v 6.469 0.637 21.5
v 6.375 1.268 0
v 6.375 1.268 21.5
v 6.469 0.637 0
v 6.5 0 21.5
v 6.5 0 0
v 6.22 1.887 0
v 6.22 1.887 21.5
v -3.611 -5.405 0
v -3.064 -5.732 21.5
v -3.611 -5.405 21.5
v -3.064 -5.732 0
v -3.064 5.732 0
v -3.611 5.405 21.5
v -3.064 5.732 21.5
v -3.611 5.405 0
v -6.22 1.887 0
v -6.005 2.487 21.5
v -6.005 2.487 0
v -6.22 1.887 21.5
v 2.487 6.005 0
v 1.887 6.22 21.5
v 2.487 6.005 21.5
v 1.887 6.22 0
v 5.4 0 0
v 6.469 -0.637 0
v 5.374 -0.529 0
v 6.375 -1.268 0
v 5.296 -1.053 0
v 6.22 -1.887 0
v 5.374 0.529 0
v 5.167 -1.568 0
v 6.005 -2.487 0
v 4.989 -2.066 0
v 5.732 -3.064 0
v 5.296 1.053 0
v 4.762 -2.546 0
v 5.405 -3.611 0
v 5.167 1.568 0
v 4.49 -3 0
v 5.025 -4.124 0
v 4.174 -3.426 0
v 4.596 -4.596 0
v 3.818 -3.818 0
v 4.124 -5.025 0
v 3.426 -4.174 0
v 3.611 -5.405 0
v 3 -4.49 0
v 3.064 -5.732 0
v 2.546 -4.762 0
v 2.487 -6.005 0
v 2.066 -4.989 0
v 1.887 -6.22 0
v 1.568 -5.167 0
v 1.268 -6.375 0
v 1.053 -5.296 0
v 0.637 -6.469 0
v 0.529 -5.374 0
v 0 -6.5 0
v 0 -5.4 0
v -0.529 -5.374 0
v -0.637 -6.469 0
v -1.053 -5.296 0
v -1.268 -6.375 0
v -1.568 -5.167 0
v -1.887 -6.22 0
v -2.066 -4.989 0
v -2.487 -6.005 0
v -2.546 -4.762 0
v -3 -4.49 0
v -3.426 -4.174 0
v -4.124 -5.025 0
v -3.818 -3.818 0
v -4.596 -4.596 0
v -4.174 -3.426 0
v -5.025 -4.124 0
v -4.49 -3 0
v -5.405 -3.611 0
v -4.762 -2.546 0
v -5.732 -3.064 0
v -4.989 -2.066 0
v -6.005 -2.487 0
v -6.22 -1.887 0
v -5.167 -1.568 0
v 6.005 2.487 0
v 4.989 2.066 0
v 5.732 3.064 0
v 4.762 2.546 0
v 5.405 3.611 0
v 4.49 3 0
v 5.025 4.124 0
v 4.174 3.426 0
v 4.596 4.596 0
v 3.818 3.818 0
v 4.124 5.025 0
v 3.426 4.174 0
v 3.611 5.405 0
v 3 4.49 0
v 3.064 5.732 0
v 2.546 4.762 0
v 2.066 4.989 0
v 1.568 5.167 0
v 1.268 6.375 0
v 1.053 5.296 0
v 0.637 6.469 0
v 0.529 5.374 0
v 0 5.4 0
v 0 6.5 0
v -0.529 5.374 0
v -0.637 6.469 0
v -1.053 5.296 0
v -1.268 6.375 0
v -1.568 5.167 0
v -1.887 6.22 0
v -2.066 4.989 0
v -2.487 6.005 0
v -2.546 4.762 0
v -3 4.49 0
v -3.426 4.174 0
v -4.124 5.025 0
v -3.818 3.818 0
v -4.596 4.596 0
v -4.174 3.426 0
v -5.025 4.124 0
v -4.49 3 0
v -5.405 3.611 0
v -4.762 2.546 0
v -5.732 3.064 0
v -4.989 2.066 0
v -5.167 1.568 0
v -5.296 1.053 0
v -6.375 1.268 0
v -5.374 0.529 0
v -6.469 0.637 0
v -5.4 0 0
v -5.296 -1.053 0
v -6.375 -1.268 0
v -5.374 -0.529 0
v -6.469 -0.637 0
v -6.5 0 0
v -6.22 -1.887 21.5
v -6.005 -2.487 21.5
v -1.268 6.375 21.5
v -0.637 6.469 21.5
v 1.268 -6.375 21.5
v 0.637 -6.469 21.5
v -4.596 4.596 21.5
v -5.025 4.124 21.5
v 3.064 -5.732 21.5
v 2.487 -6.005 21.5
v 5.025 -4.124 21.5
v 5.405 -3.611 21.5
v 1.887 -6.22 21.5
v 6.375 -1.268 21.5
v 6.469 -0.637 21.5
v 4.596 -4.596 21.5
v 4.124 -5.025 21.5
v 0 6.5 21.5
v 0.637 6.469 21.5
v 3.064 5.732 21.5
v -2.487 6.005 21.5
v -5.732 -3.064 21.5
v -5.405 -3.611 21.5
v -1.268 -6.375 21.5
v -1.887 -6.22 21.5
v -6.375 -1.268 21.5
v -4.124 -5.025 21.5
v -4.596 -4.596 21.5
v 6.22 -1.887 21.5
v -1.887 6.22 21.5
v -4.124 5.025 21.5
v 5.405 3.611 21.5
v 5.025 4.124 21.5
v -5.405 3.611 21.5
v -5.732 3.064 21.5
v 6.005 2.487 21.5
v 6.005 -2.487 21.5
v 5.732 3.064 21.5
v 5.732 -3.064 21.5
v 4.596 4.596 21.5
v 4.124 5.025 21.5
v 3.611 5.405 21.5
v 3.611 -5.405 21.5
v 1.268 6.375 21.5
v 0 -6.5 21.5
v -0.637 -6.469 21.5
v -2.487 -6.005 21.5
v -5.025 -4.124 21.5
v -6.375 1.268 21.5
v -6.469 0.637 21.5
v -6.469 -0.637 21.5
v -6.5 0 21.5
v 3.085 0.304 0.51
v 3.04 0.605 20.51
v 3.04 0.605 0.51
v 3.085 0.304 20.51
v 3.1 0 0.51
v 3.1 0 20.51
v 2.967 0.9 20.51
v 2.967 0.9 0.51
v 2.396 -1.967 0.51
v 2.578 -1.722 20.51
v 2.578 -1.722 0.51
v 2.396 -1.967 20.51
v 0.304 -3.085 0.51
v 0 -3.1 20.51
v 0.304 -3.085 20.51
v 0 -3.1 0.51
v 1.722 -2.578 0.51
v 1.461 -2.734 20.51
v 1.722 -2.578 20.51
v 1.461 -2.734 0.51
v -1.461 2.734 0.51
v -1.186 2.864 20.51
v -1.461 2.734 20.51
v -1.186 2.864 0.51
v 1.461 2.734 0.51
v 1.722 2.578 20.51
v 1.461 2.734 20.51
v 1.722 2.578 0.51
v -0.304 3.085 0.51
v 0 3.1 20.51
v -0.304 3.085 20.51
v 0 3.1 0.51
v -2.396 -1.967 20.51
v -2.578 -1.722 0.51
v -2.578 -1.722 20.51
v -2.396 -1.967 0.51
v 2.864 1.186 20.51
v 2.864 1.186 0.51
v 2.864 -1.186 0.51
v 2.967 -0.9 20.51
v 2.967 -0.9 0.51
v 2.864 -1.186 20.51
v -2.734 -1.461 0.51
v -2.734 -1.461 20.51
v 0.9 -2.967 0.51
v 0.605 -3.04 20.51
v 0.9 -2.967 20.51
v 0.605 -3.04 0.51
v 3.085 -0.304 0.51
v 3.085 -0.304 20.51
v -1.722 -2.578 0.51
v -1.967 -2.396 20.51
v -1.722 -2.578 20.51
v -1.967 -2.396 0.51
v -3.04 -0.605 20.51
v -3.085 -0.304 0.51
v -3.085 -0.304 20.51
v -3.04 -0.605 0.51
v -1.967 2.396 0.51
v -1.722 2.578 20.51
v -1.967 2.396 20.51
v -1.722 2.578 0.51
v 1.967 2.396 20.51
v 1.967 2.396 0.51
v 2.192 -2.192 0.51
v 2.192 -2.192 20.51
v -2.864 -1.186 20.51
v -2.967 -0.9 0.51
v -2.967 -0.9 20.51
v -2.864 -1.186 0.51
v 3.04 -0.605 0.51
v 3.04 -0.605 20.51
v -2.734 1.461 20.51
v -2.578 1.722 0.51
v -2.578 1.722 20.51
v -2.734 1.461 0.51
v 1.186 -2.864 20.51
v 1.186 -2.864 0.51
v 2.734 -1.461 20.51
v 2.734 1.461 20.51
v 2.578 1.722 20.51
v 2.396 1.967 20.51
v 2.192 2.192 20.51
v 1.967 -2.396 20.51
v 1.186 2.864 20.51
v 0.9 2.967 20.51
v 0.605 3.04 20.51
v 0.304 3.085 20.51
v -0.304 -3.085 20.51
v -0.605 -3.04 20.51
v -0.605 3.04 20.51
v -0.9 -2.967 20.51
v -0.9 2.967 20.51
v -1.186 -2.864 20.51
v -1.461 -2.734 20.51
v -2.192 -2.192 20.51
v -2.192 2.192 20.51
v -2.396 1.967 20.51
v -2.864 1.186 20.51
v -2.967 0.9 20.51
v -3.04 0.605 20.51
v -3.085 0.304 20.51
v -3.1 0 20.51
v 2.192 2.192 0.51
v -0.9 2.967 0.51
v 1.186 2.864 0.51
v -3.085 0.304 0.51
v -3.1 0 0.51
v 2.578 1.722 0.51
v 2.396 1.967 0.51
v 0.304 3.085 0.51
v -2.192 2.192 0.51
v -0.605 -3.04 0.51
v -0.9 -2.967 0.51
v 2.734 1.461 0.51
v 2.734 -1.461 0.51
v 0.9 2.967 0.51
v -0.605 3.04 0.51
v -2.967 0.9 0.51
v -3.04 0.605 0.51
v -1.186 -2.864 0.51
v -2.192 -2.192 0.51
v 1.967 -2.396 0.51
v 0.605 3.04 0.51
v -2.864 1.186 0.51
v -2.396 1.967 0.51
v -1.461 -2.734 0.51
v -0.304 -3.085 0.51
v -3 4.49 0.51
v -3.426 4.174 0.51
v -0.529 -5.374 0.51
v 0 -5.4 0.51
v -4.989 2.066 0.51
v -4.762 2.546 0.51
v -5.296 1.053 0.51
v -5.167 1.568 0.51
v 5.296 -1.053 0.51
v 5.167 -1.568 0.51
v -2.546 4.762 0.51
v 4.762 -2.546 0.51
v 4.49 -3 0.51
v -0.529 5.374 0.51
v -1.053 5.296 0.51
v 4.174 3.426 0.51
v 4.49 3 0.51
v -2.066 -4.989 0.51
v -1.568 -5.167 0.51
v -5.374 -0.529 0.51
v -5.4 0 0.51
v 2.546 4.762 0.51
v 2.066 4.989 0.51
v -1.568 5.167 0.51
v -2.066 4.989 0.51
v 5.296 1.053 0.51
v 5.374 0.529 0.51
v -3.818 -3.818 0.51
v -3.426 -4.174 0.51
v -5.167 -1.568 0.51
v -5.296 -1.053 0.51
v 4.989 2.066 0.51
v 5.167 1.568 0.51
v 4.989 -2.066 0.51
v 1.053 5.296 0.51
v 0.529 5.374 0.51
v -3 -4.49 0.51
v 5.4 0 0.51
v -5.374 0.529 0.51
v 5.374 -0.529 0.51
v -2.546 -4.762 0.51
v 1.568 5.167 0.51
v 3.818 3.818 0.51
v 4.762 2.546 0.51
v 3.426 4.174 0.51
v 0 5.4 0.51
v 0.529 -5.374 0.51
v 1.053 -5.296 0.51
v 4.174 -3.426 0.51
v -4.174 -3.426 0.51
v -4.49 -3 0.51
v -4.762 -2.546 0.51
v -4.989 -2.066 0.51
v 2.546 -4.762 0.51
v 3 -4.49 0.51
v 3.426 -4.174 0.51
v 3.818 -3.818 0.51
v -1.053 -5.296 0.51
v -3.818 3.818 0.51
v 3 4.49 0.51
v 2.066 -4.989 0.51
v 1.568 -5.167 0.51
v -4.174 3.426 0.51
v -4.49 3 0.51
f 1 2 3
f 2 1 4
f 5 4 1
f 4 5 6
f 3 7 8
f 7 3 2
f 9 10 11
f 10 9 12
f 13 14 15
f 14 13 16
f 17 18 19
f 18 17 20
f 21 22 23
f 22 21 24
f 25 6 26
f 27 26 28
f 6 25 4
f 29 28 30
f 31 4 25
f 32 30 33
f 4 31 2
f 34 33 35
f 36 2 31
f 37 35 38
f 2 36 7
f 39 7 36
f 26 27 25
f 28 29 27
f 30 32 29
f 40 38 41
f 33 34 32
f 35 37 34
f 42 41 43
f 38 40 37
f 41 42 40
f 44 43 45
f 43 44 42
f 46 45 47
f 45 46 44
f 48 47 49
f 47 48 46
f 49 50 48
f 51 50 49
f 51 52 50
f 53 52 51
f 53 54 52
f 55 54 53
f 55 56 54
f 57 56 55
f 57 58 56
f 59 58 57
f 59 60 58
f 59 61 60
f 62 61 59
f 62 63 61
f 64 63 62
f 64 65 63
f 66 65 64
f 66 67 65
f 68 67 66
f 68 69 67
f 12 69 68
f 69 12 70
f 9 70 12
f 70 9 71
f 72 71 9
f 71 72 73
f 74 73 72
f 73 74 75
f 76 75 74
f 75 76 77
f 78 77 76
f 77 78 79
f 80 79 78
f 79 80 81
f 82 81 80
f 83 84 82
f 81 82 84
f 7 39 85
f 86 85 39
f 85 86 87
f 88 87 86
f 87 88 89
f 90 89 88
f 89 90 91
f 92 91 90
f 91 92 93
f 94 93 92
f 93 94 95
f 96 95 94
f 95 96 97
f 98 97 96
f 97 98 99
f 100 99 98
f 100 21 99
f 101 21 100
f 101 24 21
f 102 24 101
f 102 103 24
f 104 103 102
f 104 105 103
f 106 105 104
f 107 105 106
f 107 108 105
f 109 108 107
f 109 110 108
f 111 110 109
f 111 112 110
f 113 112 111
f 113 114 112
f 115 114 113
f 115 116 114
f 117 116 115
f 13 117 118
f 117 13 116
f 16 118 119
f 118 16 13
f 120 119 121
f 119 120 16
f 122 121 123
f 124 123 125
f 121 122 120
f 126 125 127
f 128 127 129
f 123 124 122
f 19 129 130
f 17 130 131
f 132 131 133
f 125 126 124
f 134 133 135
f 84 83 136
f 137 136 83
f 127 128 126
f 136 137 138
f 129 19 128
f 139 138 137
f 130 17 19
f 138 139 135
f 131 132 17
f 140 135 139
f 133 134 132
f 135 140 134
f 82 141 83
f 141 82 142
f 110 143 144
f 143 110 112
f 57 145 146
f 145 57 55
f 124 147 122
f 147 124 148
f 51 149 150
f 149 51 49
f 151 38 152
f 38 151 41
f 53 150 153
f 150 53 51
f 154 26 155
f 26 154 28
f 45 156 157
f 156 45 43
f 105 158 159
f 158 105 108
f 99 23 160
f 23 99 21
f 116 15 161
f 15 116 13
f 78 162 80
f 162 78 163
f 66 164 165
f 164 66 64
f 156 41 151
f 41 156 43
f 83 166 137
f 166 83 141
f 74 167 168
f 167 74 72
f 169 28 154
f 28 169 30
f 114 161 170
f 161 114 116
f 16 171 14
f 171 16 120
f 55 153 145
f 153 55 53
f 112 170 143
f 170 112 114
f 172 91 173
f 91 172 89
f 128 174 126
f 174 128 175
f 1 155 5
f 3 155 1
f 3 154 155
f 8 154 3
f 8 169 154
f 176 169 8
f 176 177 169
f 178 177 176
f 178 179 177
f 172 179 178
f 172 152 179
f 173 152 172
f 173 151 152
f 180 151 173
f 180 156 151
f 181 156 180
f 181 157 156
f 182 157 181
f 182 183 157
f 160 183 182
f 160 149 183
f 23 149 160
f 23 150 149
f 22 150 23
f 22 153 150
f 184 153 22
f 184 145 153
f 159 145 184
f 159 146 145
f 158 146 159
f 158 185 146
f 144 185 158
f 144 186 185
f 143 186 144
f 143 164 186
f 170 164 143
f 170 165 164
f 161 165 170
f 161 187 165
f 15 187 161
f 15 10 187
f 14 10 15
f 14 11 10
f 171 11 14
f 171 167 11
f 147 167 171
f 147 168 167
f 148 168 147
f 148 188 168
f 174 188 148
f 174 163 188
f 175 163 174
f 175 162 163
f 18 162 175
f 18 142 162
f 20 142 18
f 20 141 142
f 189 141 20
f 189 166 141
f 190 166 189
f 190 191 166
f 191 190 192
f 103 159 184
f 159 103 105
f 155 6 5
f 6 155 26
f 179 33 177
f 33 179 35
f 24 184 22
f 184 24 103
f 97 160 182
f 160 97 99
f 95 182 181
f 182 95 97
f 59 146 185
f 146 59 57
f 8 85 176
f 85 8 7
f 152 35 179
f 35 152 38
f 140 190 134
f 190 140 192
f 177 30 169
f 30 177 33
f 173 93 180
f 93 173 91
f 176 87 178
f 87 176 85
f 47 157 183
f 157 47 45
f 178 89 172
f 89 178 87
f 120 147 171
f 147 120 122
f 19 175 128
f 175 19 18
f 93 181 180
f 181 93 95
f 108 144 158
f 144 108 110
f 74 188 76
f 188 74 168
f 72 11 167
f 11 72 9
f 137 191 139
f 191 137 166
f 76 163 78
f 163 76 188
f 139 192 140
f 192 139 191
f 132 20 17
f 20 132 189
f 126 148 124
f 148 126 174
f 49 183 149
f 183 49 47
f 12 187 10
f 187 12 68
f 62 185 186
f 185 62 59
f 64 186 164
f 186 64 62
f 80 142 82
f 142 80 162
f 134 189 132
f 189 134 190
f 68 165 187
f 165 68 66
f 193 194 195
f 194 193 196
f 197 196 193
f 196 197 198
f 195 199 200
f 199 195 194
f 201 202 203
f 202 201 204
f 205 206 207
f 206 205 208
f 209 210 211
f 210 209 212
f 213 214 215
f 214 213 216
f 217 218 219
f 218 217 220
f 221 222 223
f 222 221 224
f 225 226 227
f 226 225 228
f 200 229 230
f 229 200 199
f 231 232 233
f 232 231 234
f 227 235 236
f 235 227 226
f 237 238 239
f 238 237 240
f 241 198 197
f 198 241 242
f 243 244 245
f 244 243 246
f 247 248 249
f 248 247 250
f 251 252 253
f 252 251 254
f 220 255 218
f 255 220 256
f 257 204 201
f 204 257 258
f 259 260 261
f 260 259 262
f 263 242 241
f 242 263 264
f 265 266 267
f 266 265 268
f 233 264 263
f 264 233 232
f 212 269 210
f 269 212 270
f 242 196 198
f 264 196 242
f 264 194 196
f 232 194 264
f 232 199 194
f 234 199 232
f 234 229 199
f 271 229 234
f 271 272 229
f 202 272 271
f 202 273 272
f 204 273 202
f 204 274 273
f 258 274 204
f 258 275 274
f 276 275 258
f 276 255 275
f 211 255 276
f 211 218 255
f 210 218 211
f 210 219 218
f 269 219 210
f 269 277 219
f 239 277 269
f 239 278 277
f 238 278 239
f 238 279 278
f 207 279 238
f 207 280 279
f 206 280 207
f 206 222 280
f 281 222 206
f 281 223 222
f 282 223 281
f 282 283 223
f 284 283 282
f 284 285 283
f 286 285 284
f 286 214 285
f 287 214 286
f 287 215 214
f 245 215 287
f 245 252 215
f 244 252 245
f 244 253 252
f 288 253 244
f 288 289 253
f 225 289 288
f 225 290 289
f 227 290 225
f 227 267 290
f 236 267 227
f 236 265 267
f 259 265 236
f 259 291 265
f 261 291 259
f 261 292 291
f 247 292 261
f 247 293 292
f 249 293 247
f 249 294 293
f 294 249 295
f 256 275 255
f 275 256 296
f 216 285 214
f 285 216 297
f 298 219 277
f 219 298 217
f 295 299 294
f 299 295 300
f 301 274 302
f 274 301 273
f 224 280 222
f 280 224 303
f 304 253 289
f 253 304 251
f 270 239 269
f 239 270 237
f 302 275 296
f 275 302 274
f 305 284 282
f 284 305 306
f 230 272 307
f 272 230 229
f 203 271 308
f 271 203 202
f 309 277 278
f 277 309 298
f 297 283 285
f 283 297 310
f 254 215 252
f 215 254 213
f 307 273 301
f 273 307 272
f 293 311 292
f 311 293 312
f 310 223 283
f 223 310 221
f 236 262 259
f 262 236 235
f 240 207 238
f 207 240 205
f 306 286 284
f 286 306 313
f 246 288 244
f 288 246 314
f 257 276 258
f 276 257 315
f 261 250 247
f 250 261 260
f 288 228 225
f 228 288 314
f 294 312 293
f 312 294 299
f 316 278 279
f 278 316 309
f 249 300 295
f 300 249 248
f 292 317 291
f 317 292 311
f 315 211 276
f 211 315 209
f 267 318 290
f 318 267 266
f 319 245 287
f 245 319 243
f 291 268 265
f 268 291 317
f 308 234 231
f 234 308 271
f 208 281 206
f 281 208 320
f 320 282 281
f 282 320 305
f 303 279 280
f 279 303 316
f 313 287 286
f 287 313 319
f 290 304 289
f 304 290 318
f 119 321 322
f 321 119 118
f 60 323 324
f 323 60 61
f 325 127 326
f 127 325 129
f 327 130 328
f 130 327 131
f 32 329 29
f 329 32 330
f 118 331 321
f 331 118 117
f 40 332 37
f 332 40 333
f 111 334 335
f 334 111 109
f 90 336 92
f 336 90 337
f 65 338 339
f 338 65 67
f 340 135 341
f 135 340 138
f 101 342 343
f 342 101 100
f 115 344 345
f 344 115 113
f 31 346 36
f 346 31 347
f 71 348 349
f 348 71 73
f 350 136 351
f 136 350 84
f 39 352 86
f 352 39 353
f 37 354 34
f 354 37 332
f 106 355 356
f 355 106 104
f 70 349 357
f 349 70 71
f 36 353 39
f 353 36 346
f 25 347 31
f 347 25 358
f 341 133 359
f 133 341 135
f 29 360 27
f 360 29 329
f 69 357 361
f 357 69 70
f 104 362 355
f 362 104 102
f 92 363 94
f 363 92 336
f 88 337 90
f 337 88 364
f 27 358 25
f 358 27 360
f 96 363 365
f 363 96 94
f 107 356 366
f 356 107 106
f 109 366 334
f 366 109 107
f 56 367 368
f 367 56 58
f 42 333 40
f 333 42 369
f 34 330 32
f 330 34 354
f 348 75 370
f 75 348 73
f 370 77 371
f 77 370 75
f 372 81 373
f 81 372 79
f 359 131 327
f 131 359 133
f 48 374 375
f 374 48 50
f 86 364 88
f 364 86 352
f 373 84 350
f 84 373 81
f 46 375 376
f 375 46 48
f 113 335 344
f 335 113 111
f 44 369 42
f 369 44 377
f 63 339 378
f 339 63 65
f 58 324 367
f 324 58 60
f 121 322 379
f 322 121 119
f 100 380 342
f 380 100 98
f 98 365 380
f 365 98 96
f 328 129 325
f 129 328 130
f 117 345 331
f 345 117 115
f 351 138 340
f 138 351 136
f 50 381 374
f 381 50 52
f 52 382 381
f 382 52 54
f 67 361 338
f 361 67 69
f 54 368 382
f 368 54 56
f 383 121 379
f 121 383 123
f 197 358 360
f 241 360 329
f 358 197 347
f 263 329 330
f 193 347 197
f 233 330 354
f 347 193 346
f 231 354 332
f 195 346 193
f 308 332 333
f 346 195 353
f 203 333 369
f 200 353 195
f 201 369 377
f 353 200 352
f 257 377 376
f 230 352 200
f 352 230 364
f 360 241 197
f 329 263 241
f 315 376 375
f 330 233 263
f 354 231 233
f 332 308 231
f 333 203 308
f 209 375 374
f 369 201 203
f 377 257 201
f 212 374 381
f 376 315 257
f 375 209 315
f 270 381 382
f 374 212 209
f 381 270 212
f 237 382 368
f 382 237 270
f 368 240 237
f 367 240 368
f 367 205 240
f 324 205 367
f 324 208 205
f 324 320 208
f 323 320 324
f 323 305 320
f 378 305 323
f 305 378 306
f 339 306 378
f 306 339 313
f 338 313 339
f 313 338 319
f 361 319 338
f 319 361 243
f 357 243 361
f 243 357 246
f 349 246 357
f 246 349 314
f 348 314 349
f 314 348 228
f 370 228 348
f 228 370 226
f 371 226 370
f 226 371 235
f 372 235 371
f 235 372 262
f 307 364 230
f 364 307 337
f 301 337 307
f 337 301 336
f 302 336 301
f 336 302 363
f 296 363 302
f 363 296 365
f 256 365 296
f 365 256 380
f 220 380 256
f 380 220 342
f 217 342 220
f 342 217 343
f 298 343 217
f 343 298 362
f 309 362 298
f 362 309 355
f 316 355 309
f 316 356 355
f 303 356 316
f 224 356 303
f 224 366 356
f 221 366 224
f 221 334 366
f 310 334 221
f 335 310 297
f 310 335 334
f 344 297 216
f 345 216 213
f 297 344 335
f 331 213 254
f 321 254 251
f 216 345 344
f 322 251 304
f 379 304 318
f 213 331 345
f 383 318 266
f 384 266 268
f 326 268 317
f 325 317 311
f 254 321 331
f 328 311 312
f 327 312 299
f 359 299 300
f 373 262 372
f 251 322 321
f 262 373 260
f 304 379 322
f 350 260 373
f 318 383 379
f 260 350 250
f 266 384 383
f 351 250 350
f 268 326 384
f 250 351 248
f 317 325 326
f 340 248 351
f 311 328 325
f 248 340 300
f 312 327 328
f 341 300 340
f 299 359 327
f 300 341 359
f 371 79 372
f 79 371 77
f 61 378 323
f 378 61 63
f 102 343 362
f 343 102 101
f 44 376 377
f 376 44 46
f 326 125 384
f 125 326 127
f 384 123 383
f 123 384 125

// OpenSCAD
// PCR Tube Adapter Sleeve - fits 0.2mL tubes into 1.5mL rack holes.
// Print orientation: Collar on bed (z=0 to 1.5), body rises to z=21.5.

// Dimensions
collar_od = 13;
collar_t  = 1.5;
body_od   = 10.8;
top_z     = 21.5;
bore_d    = 6.2;

$fn = 64;

difference() {
    // Main body: Cylinder from z=0 to z=top_z (21.5)
    translate([0, 0, 0]) 
        cylinder(h = top_z, d = collar_od);
    
    // Cut out the bore through the entire height
    // Extend slightly past top_z to ensure clean hole at the top
    translate([0, 0, -1]) 
        cylinder(h = top_z + 0.01, d = bore_d);
    
    // Cut out the collar area to create the step down to the body OD
    // The collar sits on the bed (z=0 to 1.5). We cut a cylinder from z=0 to z=1.5
    // with diameter = body_od. We extend slightly past the collar top (1.5) to ensure the step is clean.
    translate([0, 0, -1]) 
        cylinder(h = collar_t + 0.01, d = body_od);
}
